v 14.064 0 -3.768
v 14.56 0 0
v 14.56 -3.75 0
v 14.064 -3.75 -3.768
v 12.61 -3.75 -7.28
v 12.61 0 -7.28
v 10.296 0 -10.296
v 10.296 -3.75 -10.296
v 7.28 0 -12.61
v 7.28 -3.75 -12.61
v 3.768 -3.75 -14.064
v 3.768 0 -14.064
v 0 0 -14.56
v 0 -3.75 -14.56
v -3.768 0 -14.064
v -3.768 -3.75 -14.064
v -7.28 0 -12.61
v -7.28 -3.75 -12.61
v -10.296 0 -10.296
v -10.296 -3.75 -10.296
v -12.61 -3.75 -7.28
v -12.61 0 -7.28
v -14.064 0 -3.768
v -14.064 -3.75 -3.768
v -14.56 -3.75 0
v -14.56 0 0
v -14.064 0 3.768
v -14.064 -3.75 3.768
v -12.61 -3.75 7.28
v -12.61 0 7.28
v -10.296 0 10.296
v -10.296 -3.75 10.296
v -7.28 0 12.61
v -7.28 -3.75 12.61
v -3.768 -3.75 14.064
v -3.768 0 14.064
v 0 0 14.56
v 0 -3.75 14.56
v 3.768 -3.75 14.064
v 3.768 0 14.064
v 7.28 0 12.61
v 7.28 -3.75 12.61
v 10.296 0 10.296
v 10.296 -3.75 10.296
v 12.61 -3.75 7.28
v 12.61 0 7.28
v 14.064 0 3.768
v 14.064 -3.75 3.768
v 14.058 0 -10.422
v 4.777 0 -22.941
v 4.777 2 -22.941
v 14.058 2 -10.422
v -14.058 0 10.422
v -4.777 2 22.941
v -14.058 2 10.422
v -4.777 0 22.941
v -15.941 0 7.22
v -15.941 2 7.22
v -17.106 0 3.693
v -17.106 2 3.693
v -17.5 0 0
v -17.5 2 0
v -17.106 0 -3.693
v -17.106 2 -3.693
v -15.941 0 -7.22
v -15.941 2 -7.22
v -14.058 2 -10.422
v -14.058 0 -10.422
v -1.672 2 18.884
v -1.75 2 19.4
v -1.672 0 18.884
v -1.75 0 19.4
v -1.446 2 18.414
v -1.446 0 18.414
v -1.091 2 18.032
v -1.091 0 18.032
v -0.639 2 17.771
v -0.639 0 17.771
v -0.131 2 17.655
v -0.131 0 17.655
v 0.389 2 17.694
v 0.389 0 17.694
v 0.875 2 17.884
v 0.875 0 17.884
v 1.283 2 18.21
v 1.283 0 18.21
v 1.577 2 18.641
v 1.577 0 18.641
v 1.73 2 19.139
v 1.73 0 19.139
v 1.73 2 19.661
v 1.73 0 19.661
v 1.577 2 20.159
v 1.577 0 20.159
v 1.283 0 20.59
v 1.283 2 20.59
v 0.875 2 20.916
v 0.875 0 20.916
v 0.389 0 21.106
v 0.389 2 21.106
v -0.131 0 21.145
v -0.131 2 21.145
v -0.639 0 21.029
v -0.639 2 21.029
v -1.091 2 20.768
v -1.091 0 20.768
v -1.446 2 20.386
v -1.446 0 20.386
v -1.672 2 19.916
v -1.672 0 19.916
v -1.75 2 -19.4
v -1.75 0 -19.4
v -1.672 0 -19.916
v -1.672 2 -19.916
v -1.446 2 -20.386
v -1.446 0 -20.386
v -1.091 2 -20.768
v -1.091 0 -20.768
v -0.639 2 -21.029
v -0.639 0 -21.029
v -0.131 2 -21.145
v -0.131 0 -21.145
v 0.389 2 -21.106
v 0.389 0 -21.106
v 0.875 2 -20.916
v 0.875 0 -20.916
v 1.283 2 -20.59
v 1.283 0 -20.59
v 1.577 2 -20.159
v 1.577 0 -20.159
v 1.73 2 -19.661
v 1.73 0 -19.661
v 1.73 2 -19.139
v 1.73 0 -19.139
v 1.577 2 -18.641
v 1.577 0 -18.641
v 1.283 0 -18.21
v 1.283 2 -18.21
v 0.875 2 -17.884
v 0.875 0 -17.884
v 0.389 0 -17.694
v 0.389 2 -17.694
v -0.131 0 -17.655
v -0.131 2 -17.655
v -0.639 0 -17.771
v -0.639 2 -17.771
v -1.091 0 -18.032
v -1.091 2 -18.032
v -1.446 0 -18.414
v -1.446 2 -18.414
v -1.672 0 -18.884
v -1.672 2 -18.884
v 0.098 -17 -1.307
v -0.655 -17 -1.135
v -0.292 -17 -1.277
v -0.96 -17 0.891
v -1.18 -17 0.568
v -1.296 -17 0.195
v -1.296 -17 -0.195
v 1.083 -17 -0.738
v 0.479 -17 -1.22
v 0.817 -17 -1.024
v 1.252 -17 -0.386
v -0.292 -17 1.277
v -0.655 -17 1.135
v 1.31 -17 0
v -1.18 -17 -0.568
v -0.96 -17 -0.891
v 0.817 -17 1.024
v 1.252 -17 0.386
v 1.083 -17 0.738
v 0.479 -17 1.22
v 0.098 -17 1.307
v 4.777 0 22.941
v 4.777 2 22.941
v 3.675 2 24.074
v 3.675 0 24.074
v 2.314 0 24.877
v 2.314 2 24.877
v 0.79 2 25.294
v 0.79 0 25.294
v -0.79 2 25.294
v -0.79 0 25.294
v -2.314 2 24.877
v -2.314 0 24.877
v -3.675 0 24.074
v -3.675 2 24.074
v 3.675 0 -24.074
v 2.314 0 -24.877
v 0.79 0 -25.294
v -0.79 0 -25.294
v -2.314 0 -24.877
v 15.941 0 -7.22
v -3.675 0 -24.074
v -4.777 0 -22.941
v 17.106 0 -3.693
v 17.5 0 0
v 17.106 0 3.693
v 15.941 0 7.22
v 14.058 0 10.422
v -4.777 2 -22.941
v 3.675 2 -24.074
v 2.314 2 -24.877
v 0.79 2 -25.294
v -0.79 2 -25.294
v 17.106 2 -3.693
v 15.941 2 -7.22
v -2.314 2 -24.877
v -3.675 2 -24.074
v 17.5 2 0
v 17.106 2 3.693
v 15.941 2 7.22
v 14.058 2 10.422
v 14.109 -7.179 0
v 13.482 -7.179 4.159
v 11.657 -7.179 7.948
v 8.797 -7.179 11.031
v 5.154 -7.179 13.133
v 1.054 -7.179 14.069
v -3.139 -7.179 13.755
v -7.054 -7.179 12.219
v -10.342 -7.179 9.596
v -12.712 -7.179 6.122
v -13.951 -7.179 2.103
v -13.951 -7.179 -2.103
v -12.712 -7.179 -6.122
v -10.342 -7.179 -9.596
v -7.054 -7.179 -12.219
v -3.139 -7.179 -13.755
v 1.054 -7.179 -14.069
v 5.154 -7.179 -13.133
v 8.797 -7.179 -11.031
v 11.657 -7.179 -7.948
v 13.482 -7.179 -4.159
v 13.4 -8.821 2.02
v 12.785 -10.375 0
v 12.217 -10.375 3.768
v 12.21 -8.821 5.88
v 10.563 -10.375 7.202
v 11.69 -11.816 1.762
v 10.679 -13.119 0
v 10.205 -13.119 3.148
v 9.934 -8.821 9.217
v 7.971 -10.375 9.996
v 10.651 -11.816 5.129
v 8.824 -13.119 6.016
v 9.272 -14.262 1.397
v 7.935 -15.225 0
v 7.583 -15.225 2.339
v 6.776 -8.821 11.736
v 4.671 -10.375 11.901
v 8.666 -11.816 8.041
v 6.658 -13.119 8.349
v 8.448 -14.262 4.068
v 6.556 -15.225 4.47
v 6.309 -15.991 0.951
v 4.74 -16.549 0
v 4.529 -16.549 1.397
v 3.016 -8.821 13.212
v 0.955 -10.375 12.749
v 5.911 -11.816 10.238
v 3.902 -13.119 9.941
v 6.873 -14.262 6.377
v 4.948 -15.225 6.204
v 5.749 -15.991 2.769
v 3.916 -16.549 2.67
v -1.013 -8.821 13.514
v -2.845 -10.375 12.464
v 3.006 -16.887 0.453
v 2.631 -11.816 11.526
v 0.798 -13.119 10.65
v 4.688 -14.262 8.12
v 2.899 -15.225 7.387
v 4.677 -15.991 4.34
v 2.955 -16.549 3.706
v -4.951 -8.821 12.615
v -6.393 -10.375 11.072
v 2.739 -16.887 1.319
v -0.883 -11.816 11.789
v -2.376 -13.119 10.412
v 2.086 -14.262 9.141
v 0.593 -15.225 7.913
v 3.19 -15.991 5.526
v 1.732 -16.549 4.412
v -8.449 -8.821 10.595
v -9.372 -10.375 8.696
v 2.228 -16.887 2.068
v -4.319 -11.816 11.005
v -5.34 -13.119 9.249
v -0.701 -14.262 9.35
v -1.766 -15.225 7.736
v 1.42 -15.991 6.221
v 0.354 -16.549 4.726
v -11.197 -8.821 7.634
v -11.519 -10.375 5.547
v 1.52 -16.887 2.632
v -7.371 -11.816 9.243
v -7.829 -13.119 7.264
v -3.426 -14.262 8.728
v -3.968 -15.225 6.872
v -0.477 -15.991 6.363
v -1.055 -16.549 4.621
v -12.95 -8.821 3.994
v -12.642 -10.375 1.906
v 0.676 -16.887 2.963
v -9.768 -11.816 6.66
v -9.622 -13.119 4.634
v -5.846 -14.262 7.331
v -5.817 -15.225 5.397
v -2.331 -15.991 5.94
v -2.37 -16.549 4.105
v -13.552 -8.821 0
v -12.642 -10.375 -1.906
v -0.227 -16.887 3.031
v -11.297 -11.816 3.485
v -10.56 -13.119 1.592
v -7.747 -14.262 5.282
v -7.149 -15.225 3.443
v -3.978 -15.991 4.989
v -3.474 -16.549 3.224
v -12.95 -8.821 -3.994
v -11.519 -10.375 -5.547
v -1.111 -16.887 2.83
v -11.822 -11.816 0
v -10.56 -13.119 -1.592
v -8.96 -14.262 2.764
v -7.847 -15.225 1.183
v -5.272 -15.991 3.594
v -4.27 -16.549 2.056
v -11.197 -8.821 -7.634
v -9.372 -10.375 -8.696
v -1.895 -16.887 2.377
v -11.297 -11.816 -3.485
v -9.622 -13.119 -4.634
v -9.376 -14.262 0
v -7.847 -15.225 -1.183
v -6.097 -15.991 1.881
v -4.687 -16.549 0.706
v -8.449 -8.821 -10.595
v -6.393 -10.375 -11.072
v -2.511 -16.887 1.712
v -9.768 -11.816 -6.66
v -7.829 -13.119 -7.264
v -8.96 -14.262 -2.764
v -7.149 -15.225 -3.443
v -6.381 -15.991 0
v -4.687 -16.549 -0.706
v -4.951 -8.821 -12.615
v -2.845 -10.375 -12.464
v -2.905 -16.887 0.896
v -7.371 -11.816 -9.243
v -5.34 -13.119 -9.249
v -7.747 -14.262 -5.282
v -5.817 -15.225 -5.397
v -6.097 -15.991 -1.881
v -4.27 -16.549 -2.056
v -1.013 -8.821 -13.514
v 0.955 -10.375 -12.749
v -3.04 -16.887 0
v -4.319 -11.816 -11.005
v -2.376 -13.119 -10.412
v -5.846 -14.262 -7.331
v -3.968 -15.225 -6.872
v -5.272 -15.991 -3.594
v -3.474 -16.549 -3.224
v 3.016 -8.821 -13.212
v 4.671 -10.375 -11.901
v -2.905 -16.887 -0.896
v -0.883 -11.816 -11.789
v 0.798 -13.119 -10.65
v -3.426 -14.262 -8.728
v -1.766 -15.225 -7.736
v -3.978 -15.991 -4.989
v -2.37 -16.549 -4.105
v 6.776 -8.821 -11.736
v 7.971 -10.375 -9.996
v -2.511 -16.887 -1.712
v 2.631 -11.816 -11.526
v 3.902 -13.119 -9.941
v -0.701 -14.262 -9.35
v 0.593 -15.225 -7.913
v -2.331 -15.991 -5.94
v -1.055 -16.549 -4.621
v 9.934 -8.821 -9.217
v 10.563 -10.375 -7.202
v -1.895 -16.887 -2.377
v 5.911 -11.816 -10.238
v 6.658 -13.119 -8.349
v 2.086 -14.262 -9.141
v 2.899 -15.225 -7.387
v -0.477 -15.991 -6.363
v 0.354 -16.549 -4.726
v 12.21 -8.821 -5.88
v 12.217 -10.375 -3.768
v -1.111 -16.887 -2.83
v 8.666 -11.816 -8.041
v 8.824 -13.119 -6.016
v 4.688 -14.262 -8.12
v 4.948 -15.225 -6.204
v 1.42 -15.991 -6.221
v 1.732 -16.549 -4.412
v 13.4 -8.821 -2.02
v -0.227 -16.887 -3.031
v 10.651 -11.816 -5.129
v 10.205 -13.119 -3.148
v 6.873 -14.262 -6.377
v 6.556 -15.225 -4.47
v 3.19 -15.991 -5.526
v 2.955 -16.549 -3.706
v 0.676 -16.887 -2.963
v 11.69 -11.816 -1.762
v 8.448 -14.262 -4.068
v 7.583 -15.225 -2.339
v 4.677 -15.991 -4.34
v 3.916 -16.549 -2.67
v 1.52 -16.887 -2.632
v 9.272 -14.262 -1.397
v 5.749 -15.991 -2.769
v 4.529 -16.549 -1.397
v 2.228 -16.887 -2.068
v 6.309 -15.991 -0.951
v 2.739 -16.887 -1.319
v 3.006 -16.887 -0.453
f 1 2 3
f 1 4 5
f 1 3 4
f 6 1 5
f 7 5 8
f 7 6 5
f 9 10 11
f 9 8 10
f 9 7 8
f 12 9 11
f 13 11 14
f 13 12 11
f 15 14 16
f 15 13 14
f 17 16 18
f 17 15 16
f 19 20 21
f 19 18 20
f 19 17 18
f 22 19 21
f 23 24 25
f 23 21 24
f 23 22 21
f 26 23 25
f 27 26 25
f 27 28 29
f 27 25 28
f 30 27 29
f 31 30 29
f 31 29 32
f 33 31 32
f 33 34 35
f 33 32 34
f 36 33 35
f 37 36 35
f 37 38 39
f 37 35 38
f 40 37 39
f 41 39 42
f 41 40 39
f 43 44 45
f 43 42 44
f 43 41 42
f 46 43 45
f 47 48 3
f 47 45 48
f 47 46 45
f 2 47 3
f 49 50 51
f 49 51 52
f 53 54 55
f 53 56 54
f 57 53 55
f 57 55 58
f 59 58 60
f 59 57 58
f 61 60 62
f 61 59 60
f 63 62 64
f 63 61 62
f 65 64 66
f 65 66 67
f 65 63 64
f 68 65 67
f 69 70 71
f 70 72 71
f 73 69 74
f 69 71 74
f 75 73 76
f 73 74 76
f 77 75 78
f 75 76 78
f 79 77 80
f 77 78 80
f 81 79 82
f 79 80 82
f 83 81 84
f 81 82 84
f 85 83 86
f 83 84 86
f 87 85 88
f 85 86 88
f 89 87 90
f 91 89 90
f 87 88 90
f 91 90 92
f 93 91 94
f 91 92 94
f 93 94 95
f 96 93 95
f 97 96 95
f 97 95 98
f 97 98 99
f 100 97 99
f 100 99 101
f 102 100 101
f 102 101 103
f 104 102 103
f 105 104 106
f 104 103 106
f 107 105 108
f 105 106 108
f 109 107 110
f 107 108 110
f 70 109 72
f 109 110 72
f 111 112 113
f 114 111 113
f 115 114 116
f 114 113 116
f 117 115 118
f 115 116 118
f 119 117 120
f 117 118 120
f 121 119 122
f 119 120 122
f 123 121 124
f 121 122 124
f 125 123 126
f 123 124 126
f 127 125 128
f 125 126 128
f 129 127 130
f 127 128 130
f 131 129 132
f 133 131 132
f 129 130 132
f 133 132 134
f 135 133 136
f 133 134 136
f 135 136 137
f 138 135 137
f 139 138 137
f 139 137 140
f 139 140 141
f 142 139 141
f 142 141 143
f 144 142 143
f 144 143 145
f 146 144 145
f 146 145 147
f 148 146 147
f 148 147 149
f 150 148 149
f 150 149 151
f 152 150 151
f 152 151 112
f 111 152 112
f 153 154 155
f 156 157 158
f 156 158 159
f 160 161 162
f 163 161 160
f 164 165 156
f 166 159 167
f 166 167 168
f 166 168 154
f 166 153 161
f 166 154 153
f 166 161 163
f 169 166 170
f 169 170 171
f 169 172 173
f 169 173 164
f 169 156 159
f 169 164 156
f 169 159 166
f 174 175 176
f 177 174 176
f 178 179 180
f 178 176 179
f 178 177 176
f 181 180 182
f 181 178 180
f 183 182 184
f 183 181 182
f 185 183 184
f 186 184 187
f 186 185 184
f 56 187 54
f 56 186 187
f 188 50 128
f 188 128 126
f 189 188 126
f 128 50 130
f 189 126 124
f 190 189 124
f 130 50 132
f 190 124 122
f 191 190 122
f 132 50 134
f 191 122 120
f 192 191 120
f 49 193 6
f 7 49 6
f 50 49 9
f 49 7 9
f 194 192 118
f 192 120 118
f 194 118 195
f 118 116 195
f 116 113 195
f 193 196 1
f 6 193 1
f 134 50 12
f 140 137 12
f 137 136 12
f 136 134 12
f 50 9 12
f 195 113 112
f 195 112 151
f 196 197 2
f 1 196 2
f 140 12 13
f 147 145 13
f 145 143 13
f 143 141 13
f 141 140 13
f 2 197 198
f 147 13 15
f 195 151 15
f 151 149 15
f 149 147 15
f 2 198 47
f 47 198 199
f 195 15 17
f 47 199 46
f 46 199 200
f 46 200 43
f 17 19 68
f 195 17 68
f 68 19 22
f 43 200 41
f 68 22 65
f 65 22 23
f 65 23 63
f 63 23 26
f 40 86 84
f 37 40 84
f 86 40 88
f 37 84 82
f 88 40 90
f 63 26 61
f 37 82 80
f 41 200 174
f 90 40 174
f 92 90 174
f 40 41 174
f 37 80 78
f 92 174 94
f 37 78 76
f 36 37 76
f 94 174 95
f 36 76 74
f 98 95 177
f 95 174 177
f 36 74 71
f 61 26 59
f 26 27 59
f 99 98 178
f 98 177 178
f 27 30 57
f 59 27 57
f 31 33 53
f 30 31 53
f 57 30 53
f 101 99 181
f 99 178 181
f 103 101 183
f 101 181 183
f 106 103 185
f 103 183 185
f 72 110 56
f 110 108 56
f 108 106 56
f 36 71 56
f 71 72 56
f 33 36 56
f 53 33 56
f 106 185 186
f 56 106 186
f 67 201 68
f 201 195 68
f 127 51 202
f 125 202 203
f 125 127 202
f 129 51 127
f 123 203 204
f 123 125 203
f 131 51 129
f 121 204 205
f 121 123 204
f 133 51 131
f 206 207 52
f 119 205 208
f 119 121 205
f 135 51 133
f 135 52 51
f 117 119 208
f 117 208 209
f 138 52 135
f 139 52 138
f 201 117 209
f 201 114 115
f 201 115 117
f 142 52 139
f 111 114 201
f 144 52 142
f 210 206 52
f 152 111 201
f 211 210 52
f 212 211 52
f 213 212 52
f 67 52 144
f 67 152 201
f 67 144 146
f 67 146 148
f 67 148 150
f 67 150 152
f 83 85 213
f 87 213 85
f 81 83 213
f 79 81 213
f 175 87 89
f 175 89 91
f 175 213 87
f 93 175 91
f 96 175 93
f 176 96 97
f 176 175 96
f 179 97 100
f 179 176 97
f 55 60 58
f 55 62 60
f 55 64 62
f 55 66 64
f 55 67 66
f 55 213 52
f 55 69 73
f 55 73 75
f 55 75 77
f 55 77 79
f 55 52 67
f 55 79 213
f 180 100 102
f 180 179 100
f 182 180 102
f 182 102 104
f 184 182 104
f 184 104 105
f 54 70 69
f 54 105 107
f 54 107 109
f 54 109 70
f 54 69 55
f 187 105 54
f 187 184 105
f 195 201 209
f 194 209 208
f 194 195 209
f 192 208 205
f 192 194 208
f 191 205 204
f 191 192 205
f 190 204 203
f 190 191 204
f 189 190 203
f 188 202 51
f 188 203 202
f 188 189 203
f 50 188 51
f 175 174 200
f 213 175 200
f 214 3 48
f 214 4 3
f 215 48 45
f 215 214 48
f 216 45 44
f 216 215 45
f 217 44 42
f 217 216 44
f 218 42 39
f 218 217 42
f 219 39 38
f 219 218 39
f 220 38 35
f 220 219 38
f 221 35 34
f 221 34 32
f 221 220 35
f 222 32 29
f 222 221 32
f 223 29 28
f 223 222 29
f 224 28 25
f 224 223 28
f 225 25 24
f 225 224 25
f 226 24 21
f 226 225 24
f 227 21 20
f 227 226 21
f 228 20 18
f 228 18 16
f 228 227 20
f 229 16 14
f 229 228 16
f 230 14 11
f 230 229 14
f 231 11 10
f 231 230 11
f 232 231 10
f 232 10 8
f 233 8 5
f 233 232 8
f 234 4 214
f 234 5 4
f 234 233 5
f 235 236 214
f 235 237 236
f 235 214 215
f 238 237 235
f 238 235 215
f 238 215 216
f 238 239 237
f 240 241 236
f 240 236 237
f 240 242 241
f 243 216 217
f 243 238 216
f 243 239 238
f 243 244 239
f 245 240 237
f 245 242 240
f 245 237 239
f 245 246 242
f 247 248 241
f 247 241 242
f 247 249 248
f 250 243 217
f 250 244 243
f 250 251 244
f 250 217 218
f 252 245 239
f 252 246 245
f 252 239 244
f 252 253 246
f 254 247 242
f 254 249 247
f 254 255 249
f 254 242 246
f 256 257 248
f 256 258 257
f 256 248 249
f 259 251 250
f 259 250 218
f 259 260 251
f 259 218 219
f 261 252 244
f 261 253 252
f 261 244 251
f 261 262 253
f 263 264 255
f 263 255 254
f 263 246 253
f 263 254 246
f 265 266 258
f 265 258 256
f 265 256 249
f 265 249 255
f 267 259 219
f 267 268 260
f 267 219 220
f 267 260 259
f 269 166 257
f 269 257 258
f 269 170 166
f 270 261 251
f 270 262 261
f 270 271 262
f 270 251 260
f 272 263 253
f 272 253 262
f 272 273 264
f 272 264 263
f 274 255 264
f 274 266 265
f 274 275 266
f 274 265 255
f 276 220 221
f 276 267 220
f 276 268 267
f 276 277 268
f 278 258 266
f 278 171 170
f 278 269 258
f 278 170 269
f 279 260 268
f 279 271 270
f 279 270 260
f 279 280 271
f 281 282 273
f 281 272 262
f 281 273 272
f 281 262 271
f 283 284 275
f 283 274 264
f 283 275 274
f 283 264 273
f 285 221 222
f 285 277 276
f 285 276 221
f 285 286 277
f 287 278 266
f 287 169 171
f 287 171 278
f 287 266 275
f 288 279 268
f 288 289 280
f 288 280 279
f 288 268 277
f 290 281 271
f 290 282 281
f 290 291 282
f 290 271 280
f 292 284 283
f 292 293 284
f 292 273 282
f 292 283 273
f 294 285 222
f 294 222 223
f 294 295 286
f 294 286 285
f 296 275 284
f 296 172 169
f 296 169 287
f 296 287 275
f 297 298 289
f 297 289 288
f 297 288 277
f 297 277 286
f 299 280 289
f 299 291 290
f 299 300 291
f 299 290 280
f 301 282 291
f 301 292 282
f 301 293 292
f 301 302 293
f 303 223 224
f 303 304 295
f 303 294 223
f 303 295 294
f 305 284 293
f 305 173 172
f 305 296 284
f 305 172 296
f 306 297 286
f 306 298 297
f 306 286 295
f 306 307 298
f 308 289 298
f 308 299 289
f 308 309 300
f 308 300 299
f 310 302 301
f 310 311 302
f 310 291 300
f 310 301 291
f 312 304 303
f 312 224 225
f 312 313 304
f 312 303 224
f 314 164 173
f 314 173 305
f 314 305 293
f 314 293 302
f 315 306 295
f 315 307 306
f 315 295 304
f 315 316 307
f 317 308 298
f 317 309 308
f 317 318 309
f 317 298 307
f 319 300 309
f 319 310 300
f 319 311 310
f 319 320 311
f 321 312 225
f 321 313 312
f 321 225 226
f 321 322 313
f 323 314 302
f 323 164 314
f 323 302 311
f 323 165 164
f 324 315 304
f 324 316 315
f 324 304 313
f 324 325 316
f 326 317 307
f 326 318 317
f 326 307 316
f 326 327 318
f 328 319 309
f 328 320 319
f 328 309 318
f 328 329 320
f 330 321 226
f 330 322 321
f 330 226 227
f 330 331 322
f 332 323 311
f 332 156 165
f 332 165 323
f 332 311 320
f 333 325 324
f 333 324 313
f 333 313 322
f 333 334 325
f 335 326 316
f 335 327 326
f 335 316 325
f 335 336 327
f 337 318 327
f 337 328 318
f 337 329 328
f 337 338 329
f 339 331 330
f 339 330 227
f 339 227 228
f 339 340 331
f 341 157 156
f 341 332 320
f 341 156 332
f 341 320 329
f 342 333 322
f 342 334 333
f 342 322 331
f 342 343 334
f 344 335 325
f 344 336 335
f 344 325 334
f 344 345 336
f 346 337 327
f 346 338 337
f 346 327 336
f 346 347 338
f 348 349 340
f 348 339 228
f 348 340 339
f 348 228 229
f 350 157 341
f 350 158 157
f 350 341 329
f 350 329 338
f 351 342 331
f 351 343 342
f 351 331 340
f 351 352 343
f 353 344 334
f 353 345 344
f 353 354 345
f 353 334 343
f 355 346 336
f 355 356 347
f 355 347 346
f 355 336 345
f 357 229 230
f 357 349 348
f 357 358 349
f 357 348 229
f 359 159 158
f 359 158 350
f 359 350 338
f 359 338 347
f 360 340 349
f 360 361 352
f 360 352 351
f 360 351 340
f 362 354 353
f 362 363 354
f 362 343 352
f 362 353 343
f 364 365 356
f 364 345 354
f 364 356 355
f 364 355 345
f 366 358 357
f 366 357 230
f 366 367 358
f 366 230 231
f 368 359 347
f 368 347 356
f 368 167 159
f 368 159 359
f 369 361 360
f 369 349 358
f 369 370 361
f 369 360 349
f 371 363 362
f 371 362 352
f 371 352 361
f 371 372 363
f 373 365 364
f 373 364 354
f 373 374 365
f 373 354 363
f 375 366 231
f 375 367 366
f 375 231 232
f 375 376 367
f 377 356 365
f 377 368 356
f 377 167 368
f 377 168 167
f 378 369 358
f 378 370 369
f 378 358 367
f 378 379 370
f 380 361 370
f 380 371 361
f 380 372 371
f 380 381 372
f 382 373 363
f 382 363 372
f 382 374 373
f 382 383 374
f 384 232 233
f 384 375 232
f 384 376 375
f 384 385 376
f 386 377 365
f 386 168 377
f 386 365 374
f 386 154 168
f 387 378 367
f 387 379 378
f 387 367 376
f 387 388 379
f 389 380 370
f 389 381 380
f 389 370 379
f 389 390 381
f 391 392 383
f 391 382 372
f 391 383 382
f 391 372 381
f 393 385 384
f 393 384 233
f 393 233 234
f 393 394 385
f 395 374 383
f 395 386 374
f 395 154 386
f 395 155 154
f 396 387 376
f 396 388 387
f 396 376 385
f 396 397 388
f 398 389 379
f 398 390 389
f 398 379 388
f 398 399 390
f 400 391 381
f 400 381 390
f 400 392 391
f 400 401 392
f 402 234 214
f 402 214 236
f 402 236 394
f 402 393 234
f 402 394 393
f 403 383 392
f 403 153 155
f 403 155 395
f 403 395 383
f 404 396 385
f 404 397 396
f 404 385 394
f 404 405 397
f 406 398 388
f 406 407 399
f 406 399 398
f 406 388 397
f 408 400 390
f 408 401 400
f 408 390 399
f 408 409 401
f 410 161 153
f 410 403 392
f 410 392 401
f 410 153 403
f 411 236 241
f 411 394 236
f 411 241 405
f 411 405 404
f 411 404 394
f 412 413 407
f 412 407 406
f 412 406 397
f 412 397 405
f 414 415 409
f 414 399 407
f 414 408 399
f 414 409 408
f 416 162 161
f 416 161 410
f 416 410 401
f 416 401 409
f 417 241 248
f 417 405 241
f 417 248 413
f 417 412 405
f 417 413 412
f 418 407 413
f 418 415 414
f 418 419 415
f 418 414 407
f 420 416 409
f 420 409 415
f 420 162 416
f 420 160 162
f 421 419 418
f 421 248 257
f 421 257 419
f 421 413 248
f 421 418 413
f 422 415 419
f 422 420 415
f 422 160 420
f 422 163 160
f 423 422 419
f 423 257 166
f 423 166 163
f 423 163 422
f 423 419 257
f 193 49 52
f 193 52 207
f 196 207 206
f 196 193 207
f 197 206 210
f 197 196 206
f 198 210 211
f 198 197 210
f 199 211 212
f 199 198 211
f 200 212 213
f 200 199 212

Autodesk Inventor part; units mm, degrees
ref_plane "YZ Plane" through (0, 0, 0) normal (1, 0, 0) x (0, 1, 0)
ref_plane "XZ Plane" through (0, 0, 0) normal (0, 1, 0) x (-1, 0, 0)
ref_plane "XY Plane" through (0, 0, 0) normal (0, 0, 1) x (1, 0, 0)
sketch "Esquisse1" plane through (0, 0, 0) normal (0, 1, 0) x (-1, 0, 0)
  circle A0 centre (0, 0) radius 17.5
  circle A1 centre (0, 19.4) radius 1.75
  line L0 (13, 0) -> (-12, 0)
  circle A2 centre (0, -19.4) radius 1.75
  circle A3 centre (0, 19.4) radius 5.9464
  line L1 (4.7769, 22.9414) -> (14.0581, 10.422)
  line L2 (0, 31) -> (0, -30)
  line L3 (-4.7769, 22.9414) -> (-14.0581, 10.422)
  circle A4 centre (0, -19.4) radius 5.9464
  line L4 (4.7769, -22.9414) -> (14.0581, -10.422)
  line L5 (-4.7769, -22.9414) -> (-14.0581, -10.422)
  dimension "d1" = 35
  dimension "d3" = 11.8928
  dimension "d0" = 3.5
  dimension "d2" = 19.4
extrude "Extrusion1" add sketch "Esquisse1" along normal blind 2 contours A0 A4 L2 A3 | A0 A3 L1 | L4 A4 A0 | A3 L2 A0 | A0 L2 A1 A3 | A4 L2 A2 A0 | A0 L2 A4 | L2 A3 A0 | A0 A3 L2 A1 | L2 A4 A0 A3 | L2 A2 A4 A0 | A0 A4 L2 | A0 L3 A3 | A4 L5 A0
sketch "Esquisse2" plane through (0, 0, 0) normal (0, -1, 0) x (1, 0, 0)
  circle A0 centre (0, 0) radius 14.5602
extrude "Extrusion2" add sketch "Esquisse2" along normal blind 17
fillet "Congé1" radius 13.25 1 edges at (-14.5602, -17, 0)
properties part number "roulette"
